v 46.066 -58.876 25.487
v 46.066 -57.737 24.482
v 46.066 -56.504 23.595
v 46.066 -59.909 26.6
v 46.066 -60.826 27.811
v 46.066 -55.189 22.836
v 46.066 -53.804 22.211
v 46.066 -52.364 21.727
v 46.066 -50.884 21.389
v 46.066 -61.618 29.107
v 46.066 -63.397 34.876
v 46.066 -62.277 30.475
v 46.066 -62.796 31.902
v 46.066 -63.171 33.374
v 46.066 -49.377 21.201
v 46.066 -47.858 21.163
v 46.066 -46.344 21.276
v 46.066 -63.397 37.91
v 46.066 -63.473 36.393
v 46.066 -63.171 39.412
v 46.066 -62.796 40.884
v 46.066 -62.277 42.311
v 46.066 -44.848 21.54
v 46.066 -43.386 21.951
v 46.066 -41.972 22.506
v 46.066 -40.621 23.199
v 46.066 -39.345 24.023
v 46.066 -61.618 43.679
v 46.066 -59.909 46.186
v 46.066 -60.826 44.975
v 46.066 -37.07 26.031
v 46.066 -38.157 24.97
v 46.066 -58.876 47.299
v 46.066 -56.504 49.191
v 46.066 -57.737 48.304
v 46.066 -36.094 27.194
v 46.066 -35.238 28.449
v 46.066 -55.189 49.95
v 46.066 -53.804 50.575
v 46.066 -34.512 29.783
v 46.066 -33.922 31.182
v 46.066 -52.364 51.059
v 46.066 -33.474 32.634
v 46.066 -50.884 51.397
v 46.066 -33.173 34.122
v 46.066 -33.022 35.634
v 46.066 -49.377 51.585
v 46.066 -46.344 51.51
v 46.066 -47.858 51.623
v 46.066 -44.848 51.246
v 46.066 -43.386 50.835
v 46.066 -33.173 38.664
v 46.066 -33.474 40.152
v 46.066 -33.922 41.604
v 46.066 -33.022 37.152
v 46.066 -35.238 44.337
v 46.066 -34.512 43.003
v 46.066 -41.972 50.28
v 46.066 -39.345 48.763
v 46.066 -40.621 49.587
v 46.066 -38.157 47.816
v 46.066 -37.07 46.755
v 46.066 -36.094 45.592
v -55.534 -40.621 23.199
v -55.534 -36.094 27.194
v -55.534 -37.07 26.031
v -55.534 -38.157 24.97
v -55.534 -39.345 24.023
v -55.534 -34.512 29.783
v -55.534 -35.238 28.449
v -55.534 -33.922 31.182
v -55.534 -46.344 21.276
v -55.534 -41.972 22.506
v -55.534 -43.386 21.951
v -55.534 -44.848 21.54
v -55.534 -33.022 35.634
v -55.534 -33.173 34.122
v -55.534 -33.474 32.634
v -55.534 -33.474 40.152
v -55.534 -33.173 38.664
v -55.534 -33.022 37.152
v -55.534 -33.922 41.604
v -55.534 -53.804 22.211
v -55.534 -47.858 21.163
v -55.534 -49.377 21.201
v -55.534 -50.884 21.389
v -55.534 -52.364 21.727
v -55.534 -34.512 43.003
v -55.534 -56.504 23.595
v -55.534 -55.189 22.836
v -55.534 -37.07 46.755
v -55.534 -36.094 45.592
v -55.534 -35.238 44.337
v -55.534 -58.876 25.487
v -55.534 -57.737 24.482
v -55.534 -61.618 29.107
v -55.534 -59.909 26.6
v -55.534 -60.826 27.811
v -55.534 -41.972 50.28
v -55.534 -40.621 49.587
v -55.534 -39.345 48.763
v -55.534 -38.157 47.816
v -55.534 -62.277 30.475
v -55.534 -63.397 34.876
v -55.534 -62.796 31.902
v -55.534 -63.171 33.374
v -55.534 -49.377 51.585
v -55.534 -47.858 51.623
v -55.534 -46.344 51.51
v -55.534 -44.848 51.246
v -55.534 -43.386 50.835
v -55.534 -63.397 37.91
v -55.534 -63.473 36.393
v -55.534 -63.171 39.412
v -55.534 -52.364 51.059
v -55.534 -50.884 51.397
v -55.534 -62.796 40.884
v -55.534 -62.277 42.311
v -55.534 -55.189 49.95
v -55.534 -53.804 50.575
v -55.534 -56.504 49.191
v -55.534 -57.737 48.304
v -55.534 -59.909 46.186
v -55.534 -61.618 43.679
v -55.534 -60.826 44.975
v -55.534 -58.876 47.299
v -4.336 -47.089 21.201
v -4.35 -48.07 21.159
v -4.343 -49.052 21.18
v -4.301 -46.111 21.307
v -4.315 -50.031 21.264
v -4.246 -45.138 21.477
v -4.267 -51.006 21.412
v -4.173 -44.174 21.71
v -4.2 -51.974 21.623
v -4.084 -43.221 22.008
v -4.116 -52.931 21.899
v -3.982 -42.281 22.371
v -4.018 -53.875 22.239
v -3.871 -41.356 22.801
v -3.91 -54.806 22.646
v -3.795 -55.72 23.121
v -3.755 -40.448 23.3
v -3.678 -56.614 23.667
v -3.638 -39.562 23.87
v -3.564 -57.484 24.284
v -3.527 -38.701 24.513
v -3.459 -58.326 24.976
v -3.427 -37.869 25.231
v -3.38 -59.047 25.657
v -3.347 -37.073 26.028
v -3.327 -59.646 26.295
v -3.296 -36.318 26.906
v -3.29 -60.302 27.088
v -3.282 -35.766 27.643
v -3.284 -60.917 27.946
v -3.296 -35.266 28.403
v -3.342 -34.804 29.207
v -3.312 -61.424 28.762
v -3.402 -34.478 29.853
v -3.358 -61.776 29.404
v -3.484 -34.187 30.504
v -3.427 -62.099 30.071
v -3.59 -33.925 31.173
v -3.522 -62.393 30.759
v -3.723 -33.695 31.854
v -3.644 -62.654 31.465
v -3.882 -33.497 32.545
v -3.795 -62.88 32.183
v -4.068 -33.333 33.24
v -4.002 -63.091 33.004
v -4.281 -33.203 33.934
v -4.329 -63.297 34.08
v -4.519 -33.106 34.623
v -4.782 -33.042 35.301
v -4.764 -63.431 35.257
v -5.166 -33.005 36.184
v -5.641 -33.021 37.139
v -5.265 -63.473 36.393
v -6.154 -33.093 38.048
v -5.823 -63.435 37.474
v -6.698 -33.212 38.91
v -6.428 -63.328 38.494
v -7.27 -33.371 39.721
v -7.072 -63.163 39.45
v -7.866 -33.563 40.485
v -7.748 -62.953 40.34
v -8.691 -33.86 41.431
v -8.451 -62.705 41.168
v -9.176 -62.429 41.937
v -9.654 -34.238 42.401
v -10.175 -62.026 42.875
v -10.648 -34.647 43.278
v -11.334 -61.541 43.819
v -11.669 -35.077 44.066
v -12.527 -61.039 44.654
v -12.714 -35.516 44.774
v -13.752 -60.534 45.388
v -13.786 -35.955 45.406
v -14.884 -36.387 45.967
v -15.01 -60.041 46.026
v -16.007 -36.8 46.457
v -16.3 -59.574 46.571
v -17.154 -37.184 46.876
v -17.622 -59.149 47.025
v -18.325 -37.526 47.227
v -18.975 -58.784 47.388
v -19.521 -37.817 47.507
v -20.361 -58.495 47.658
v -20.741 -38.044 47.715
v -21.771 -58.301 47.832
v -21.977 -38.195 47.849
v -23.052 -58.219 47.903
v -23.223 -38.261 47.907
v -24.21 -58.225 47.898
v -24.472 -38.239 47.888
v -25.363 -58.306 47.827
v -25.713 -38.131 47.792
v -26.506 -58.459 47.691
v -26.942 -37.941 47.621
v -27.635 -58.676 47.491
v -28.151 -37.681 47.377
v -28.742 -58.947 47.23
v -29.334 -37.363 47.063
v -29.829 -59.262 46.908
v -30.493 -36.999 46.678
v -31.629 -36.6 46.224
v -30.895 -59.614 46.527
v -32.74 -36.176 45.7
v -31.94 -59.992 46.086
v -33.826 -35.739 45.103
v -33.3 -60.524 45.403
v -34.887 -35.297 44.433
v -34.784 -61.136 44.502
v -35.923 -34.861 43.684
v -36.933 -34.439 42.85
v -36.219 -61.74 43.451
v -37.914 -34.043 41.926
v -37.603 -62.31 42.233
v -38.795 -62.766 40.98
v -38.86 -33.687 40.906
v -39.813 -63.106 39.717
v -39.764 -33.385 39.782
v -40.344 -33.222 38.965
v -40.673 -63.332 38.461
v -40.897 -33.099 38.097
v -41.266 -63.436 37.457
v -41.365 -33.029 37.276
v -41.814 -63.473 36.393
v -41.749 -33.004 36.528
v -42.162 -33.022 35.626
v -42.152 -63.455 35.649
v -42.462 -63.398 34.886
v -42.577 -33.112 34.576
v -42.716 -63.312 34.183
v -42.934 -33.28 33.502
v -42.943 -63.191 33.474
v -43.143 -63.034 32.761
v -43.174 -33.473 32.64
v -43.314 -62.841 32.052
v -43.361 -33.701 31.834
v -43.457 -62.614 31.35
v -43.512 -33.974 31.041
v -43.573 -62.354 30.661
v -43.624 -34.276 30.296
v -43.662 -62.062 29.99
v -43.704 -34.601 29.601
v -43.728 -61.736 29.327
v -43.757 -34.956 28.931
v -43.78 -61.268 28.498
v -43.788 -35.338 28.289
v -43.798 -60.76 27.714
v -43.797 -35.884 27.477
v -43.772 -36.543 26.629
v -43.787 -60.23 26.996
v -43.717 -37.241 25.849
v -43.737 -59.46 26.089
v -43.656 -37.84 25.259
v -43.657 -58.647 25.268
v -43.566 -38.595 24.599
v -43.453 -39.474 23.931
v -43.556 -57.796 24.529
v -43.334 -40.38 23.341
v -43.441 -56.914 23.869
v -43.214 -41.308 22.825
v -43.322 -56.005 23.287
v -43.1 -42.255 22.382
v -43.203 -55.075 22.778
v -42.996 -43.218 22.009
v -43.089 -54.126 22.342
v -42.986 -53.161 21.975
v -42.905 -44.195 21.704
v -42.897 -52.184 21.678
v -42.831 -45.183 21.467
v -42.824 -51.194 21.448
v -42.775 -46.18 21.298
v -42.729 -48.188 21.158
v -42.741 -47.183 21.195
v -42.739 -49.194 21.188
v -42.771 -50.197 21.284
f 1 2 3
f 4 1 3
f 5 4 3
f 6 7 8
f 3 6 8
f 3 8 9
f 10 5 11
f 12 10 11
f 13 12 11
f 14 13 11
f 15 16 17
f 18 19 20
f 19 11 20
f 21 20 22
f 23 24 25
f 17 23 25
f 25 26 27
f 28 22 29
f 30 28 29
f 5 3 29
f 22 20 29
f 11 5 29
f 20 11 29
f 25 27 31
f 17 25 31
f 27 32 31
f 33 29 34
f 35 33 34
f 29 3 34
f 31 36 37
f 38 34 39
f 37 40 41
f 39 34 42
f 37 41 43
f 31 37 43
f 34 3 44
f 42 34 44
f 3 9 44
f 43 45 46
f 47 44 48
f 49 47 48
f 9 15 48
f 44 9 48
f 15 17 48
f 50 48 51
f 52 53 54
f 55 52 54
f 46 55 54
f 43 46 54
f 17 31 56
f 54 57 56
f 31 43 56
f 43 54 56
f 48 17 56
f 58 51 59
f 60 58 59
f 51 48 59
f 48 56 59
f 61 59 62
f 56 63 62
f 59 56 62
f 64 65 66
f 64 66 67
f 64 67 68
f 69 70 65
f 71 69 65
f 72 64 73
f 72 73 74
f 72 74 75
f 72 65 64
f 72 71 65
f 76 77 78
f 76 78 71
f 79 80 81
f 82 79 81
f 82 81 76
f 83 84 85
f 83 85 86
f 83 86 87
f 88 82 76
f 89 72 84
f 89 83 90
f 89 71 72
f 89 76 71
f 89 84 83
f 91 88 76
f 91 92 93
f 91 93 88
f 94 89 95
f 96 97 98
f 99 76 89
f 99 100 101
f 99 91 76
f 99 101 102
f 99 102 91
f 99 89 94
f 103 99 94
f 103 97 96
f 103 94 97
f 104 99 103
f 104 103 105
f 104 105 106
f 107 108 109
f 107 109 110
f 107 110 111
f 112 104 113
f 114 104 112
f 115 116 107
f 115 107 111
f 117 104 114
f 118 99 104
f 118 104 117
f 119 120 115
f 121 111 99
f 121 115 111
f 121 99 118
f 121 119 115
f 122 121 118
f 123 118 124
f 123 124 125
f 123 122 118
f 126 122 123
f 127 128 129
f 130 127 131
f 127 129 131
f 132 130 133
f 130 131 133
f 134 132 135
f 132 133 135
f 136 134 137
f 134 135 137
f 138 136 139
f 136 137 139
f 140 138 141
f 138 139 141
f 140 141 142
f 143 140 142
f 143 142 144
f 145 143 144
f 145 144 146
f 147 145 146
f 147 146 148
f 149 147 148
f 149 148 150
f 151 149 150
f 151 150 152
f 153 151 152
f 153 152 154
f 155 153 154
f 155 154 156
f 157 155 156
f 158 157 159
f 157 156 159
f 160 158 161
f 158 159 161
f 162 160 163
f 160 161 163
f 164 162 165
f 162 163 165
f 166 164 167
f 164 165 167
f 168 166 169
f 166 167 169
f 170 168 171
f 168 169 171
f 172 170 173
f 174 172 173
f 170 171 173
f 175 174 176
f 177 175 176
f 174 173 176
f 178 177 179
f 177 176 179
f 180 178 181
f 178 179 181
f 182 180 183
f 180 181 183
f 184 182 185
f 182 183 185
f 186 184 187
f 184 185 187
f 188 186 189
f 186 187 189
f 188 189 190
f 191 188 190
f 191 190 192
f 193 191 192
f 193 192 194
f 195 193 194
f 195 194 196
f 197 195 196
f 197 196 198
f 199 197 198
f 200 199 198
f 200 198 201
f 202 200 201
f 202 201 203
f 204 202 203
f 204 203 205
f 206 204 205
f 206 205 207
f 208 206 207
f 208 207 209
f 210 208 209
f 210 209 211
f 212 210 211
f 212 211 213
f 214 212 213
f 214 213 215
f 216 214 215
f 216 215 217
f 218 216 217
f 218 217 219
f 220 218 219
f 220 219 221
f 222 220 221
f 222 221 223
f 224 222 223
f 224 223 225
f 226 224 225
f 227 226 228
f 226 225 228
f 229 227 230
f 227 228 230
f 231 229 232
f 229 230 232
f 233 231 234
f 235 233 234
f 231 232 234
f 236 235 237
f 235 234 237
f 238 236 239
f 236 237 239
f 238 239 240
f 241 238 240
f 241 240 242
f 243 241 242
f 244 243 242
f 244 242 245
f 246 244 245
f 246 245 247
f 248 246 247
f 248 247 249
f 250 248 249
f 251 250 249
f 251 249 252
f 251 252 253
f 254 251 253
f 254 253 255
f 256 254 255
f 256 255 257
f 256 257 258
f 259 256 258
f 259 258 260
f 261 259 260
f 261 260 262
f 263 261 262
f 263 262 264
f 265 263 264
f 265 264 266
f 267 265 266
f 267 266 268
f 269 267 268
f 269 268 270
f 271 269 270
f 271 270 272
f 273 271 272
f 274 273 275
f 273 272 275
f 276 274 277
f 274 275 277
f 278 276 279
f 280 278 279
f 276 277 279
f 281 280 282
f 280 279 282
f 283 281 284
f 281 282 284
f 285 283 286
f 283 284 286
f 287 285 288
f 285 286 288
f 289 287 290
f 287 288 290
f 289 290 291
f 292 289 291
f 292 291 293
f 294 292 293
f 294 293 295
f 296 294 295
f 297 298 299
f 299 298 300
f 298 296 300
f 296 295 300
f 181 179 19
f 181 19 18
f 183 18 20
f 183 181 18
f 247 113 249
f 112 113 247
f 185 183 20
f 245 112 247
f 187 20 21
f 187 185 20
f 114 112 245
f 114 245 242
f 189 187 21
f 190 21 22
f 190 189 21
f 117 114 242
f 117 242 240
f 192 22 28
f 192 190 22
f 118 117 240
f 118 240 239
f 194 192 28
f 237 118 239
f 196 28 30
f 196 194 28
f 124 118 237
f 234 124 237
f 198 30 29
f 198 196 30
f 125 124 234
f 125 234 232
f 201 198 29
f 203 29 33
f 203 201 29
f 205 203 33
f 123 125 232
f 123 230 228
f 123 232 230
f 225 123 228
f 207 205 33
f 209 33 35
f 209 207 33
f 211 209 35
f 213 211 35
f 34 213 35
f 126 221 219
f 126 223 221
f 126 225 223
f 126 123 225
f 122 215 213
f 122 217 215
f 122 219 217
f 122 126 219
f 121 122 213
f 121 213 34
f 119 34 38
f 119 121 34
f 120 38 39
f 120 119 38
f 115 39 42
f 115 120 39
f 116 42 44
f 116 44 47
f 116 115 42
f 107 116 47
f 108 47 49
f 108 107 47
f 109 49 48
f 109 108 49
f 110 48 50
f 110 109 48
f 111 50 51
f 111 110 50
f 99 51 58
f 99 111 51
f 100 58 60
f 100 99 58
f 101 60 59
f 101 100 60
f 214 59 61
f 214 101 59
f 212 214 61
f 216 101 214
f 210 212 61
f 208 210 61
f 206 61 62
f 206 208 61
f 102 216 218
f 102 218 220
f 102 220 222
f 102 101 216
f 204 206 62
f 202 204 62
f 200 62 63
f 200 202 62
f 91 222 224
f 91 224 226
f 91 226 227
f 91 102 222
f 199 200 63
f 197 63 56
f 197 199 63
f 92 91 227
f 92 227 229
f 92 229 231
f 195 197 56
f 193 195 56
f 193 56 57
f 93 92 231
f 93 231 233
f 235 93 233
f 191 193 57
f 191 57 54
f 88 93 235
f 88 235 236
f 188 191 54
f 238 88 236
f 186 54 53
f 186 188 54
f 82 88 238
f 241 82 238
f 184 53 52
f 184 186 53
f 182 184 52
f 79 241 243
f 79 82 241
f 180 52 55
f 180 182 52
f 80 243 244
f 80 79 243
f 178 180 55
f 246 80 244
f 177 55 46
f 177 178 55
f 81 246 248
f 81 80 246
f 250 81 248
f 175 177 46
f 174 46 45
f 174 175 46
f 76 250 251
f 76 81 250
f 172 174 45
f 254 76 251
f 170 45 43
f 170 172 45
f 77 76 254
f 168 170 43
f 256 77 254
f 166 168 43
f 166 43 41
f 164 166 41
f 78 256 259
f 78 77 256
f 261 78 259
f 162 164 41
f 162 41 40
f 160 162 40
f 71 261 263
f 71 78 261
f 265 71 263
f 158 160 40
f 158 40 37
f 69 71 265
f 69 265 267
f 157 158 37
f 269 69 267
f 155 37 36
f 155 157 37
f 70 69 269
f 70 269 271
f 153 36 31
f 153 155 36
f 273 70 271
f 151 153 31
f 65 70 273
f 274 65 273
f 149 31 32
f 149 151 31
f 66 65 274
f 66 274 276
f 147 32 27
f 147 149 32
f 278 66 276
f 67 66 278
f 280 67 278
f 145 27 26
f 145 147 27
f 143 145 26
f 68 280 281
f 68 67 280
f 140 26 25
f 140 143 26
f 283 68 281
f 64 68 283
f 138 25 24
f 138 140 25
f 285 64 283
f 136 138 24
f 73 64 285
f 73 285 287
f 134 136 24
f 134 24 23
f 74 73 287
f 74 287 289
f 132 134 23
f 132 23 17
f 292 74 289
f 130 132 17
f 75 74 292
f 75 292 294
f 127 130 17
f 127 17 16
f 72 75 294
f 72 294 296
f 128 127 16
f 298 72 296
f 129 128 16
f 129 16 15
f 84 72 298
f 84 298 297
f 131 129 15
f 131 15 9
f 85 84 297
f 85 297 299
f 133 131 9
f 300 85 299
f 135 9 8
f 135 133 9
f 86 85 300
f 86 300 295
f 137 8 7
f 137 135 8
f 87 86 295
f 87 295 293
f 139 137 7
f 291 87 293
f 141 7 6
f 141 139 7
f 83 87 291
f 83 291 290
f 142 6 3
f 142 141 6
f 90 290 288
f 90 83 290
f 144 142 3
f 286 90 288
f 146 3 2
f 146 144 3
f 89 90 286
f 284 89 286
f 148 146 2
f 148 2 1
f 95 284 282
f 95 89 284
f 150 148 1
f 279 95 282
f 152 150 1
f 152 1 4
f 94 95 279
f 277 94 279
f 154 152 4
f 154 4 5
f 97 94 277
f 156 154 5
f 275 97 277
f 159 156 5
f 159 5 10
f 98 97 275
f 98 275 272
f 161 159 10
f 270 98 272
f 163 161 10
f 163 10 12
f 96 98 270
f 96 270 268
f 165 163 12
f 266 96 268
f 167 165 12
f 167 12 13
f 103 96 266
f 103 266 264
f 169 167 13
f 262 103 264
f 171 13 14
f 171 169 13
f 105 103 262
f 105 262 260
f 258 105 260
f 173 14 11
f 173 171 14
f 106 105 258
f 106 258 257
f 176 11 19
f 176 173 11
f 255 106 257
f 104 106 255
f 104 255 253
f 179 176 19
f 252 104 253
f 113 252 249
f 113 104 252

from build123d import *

# Parameters (mm, degrees)
F0_W     = 101.6
F0_H     = 101.6
F1_DEPTH = 101.6
F2_R     = 20.257871
F3_DEPTH = 101.601
F4_R     = 15.235022
F5_DEPTH = 101.601


with BuildPart() as f1:
    # F0 (on Front) → F1 (new body)
    with BuildSketch(Plane.XZ):
        with Locations((-4.734128, 2.650937)):
            Rectangle(F0_W, F0_H)
    extrude(amount=F1_DEPTH)

    # F2 (on face) → F3 (cut, through all)
    with BuildSketch(Plane.XZ.offset(101.6)):
        with Locations((-23.539765, 27.651252)):
            Circle(F2_R)
    extrude(amount=-F3_DEPTH, mode=Mode.SUBTRACT)

    # F4 (on face) → F5 (intersect, through all)
    with BuildSketch(Plane(origin=(-55.534128, 0, 0), x_dir=(0, -1, 0), z_dir=(-1, 0, 0))):
        with Locations((48.238128, 36.392964)):
            Circle(F4_R)
    extrude(amount=-F5_DEPTH, mode=Mode.INTERSECT)


solid = f1.part
